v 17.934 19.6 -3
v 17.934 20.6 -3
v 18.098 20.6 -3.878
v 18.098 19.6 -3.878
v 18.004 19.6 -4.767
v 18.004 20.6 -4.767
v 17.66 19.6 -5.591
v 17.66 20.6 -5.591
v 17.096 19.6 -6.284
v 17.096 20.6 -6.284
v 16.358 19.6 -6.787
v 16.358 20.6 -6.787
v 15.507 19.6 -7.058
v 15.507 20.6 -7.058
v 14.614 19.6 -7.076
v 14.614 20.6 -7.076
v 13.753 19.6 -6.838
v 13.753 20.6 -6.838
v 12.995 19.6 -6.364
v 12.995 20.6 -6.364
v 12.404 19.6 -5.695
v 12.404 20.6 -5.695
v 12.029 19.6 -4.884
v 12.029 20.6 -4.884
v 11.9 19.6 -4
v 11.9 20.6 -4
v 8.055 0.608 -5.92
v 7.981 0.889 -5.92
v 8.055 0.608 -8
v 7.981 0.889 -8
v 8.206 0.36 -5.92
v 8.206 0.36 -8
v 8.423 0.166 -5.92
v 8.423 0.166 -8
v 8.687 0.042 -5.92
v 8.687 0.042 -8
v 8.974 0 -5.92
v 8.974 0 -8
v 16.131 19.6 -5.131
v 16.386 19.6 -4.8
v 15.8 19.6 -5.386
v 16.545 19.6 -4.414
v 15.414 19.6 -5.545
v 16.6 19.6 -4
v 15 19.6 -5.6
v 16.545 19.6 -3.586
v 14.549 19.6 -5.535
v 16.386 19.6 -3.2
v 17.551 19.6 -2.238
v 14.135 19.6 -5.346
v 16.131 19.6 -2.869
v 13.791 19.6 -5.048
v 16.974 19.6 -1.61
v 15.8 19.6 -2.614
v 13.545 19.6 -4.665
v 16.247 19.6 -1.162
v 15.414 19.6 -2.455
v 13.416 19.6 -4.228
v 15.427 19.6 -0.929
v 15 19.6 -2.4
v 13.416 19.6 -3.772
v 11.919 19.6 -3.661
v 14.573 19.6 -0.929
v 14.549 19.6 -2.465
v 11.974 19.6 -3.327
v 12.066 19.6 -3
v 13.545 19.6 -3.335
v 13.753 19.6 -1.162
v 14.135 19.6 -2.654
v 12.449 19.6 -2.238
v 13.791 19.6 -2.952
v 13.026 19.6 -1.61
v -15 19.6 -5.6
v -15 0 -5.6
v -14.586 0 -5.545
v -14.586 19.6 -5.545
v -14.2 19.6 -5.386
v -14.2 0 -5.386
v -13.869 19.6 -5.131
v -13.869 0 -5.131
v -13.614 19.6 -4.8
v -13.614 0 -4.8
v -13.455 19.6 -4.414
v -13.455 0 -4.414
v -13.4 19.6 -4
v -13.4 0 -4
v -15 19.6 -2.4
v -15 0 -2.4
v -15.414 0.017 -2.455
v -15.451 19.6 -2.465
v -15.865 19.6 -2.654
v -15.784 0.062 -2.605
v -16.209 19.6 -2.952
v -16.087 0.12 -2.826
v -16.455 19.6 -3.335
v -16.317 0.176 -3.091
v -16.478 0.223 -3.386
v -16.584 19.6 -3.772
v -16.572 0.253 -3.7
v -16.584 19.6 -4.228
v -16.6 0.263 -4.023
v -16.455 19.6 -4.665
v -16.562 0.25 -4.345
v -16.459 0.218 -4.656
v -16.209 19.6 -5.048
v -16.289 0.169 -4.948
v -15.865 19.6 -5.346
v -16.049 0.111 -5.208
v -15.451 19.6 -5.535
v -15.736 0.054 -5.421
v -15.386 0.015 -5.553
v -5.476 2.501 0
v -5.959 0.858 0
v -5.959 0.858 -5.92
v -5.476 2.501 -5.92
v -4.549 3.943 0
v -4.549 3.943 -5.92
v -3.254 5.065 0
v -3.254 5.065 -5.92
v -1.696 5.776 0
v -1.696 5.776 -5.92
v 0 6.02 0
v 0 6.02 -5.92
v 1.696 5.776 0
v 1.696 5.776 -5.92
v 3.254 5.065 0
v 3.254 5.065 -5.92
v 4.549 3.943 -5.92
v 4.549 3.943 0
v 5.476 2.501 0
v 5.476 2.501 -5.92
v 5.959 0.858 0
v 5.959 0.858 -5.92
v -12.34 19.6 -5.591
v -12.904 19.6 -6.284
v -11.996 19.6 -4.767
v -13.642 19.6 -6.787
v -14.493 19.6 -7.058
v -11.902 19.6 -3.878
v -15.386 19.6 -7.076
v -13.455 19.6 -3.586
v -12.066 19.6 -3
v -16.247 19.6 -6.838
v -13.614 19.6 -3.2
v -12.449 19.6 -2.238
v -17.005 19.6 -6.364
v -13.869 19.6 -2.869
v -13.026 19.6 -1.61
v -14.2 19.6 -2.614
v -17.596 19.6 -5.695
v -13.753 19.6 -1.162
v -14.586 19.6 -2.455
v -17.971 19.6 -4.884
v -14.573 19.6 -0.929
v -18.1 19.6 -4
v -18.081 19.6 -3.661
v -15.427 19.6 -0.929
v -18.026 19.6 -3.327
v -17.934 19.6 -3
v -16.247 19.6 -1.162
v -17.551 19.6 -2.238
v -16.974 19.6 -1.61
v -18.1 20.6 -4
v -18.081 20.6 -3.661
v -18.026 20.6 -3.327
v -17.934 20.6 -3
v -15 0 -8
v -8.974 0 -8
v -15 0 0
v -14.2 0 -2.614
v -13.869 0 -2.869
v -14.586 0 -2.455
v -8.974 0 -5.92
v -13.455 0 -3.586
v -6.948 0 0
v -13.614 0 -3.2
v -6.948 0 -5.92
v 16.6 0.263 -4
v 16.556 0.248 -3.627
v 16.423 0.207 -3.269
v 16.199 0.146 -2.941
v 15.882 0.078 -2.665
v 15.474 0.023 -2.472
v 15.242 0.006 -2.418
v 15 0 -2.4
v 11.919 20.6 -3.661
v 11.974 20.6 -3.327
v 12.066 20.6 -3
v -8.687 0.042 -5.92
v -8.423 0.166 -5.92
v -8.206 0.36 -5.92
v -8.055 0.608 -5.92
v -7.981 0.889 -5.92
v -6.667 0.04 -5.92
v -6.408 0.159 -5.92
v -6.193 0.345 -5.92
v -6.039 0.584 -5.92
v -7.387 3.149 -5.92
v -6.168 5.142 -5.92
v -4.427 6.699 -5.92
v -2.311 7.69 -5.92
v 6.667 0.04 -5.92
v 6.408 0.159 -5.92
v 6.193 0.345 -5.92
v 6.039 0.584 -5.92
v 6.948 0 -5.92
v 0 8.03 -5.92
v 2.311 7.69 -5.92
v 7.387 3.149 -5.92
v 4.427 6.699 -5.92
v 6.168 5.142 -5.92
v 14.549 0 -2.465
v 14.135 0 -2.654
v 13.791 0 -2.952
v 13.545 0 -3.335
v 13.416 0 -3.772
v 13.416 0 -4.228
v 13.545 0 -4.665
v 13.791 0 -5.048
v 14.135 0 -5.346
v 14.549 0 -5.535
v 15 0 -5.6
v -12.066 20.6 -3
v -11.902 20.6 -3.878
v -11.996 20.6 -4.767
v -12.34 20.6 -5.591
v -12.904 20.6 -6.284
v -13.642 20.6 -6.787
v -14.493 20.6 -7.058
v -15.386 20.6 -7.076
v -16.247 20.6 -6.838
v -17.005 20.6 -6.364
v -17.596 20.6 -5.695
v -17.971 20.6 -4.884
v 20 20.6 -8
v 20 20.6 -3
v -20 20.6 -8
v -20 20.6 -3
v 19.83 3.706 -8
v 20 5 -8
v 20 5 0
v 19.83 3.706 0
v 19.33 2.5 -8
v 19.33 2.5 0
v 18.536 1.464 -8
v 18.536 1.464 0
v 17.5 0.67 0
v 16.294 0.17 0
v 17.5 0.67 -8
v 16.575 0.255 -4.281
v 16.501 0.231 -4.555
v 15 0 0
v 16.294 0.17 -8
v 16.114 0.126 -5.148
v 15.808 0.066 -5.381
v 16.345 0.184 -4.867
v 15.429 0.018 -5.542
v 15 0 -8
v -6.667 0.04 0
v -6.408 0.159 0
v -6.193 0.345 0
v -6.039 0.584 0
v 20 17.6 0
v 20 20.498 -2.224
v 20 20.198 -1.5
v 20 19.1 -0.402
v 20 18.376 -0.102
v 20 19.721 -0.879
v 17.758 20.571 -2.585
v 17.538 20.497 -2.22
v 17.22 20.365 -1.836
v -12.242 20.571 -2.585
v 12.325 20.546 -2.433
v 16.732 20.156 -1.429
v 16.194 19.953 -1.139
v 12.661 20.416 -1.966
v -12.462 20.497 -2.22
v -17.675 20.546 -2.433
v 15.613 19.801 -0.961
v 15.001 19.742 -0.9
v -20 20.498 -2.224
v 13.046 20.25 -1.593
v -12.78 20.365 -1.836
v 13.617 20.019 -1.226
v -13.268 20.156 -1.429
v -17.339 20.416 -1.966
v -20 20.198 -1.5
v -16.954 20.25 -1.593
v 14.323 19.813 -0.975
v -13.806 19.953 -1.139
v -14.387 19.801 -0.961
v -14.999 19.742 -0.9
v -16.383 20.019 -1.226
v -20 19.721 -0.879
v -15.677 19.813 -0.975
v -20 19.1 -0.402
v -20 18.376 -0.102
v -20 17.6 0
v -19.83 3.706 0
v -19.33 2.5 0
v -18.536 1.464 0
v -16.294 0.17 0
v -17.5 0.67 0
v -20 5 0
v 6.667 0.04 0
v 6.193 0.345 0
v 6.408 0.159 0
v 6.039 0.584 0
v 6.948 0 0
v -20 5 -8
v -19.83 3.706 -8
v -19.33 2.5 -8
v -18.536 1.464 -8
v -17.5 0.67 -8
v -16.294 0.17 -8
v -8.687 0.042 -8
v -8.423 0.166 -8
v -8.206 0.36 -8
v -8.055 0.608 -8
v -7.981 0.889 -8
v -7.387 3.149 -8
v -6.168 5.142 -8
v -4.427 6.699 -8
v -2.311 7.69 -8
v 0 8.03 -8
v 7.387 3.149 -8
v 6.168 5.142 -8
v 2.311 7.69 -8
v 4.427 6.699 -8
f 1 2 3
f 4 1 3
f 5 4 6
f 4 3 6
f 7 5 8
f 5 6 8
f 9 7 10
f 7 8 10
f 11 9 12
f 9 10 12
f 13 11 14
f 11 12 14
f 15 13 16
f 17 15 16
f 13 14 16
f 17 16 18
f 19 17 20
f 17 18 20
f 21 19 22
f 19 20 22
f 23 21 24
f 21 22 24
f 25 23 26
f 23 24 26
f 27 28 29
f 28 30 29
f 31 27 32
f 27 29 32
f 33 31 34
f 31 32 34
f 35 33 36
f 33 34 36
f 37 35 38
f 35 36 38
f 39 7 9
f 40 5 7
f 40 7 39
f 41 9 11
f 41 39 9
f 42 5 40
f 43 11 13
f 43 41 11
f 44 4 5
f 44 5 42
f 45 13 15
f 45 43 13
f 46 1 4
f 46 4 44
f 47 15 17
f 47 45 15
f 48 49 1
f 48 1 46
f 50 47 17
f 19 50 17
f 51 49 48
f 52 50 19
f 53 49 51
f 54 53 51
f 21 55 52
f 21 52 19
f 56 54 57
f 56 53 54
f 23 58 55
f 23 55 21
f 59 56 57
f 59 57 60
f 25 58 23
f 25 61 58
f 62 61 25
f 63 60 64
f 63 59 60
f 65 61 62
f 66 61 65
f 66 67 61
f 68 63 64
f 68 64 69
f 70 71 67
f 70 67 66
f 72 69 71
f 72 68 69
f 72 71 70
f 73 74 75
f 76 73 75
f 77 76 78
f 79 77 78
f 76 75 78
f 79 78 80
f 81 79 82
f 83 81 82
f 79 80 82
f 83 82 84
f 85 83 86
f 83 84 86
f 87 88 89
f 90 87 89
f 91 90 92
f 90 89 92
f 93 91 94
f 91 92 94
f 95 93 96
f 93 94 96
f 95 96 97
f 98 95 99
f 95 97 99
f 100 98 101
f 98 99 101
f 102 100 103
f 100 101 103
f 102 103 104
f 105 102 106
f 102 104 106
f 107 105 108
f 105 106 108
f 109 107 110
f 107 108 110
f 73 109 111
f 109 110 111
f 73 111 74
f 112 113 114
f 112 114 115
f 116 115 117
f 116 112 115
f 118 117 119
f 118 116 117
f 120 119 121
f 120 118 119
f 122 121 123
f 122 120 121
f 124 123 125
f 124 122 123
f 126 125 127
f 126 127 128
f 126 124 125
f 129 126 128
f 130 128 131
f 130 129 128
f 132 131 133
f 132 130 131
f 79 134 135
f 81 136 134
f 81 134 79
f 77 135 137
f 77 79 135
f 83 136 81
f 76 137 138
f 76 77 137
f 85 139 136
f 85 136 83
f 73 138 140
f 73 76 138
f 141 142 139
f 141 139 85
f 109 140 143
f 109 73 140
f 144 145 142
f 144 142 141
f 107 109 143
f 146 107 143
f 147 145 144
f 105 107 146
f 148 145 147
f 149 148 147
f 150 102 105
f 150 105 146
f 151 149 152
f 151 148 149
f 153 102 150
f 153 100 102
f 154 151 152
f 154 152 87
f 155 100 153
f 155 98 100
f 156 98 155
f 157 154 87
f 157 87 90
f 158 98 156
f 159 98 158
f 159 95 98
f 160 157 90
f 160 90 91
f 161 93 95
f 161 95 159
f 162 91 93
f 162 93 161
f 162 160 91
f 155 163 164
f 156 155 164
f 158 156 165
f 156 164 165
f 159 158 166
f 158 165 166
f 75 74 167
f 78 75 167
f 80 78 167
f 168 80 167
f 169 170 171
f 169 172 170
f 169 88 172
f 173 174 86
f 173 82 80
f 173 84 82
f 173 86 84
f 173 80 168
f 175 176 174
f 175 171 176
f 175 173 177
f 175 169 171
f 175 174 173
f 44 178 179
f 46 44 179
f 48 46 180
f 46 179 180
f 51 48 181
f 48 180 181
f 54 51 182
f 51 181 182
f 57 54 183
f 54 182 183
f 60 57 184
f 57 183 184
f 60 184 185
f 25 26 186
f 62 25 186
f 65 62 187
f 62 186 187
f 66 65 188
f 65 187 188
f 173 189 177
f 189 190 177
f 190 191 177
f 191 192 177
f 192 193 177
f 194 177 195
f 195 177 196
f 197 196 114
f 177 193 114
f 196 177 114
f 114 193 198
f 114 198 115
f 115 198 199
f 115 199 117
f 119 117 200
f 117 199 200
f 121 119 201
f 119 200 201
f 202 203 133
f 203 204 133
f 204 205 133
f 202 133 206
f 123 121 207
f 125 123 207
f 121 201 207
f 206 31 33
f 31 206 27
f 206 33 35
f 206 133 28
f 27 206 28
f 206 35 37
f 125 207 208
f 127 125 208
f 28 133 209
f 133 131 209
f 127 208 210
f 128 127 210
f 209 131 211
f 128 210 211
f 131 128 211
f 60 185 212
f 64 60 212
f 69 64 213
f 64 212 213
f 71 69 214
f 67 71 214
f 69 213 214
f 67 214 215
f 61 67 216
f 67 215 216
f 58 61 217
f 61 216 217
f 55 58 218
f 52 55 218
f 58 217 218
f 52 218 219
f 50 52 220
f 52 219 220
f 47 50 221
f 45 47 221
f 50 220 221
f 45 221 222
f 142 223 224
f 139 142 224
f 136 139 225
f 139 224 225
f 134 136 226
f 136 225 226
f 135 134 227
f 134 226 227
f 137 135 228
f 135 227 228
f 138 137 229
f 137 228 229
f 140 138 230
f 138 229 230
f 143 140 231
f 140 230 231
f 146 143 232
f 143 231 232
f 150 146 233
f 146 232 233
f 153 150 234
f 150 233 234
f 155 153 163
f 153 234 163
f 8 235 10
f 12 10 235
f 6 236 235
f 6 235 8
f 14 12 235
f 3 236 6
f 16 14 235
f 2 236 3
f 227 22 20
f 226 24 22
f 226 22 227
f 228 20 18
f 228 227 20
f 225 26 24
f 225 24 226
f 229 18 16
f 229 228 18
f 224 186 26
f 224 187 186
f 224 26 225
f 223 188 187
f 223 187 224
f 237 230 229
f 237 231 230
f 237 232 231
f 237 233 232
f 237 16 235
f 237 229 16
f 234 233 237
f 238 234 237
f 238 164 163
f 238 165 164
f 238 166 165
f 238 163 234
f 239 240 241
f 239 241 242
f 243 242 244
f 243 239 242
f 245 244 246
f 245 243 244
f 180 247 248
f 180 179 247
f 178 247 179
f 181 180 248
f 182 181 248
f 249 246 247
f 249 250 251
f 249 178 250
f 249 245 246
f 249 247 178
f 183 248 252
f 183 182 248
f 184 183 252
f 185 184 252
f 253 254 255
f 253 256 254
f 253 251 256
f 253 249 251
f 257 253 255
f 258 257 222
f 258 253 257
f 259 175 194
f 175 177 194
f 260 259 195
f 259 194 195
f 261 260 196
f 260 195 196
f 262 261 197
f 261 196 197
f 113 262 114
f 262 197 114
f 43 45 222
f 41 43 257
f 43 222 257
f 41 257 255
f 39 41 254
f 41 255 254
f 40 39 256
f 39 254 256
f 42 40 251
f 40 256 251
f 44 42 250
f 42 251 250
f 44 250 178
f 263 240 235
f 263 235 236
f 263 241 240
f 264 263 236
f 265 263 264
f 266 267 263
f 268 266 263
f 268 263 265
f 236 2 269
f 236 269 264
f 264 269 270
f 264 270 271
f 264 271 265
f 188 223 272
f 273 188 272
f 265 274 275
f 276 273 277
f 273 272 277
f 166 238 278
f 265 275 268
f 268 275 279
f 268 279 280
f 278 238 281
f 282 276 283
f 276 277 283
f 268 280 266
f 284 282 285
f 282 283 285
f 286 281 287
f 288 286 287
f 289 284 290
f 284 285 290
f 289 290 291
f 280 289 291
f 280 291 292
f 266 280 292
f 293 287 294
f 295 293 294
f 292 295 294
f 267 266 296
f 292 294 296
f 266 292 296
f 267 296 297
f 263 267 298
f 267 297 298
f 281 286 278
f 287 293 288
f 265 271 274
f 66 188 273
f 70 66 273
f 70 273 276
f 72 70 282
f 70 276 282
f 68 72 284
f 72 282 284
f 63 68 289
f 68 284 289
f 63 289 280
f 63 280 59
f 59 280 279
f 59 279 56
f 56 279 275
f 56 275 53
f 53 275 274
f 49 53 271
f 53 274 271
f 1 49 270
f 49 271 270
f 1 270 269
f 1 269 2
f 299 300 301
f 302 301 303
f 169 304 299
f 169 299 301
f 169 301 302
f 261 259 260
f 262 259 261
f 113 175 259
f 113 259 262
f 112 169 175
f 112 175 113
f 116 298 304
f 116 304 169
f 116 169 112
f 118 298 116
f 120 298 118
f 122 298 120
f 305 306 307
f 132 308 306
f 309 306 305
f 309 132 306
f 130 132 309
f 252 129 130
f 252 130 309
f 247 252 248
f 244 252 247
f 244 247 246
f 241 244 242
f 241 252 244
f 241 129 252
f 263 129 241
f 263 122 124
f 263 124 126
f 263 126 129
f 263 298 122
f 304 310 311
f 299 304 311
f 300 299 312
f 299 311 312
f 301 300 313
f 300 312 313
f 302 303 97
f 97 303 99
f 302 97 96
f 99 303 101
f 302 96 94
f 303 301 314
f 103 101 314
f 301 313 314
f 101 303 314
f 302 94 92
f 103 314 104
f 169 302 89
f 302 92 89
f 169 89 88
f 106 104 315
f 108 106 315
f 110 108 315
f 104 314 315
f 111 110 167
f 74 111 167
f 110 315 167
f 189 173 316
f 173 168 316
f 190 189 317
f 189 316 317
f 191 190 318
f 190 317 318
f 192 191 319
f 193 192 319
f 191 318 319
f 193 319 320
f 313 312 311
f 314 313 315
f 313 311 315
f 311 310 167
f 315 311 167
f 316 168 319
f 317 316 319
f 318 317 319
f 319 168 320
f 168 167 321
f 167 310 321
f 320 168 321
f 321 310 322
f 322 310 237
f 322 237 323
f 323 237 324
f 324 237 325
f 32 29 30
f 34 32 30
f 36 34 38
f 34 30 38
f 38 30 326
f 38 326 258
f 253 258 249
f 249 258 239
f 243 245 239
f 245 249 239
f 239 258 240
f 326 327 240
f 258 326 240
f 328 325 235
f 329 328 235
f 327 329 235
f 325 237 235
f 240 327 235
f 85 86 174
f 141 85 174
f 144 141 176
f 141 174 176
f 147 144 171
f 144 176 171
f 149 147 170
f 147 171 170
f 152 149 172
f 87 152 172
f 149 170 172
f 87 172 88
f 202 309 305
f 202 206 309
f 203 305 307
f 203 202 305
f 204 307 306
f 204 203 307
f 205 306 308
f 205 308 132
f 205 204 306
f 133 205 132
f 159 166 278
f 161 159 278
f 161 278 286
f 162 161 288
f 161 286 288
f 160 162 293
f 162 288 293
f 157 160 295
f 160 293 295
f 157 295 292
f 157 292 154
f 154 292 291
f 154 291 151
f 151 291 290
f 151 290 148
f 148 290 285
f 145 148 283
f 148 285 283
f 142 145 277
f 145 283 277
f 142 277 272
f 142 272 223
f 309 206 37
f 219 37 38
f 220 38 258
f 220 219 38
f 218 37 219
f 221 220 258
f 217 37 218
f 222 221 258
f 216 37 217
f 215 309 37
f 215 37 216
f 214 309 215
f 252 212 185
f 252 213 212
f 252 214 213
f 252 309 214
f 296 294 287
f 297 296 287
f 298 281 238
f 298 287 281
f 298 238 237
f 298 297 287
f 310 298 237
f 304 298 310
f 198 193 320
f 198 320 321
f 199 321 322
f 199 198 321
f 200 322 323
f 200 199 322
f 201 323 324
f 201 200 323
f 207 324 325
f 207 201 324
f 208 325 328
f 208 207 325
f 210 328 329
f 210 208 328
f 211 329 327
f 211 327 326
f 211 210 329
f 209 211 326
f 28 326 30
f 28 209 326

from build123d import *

# Parameters (mm, degrees)
F1_DEPTH  = 8
F2_DEPTH  = 5.92
F3_R      = 3
F4_R      = 5
F6_DEPTH  = 20.601
F8_DEPTH  = 20.6010001
F9_R      = 1
F11_DEPTH = 1


with BuildPart() as f1:
    # F0 (on Top) → F1 (new body)
    with BuildSketch(Plane.XY):
        with BuildLine():
            Line((-20, 20.6), (-20, 0))
            Line((-20, 0), (-8.03, 0))
            ThreePointArc((-8.03, 0), (0, 8.03), (8.03, 0))
            Line((8.03, 0), (20, 0))
            Line((20, 0), (20, 20.6))
            Line((20, 20.6), (-20, 20.6))
        make_face()
    extrude(amount=-F1_DEPTH)

    # F0 (on Top) → F2 (join)
    with BuildSketch(Plane.XY):
        with BuildLine():
            ThreePointArc((8.03, 0), (0, 8.03), (-8.03, 0))
            Line((-8.03, 0), (-6.02, 0))
            ThreePointArc((-6.02, 0), (0, 6.02), (6.02, 0))
            Line((6.02, 0), (8.03, 0))
        make_face()
    extrude(amount=-F2_DEPTH)

    # F3
    f3_edges = [f1.edges().sort_by_distance(p)[0] for p in [
        (0, 20.6, 0),
    ]]
    fillet(f3_edges, radius=F3_R)

    # F4
    f4_edges = [f1.edges().sort_by_distance(p)[0] for p in [
        (-20, 0, -4),
        (20, 0, -4),
    ]]
    fillet(f4_edges, radius=F4_R)

    # F5 (on face) → F6 (cut, through all)
    with BuildSketch(Plane.XZ):
        with BuildLine():
            Line((-15, -5.6), (-15, -2.4))
            ThreePointArc((-15, -2.4), (-16.6, -4), (-15, -5.6))
        make_face()
        with BuildLine():
            ThreePointArc((-15, -5.6), (-13.8686291501, -5.1313708499), (-13.4, -4))
            ThreePointArc((-13.4, -4), (-13.8686291501, -2.8686291501), (-15, -2.4))
            Line((-15, -2.4), (-15, -5.6))
        make_face()
    extrude(amount=-F6_DEPTH, mode=Mode.SUBTRACT)

    # F7 (on face) → F8 (cut, through all)
    with BuildSketch(Plane.XZ):
        with BuildLine():
            Line((15, -5.6), (15, -2.4))
            ThreePointArc((15, -2.4), (13.4, -4), (15, -5.6))
        make_face()
        with BuildLine():
            ThreePointArc((15, -5.6), (16.1313708499, -5.1313708499), (16.6, -4))
            ThreePointArc((16.6, -4), (16.1313708499, -2.8686291501), (15, -2.4))
            Line((15, -2.4), (15, -5.6))
        make_face()
    extrude(amount=-F8_DEPTH, mode=Mode.SUBTRACT)

    # F9
    f9_edges = [f1.edges().sort_by_distance(p)[0] for p in [
        (-8.03, 0, -6.96),
        (-6.02, 0, -2.96),
        (6.02, 0, -2.96),
        (8.03, 0, -6.96),
    ]]
    fillet(f9_edges, radius=F9_R)

    # F10 (on face) → F11 (cut)
    with BuildSketch(Plane(origin=(0, 20.6, 0), x_dir=(-1, 0, 0), z_dir=(0, 1, 0))):
        with BuildLine():
            Line((-13.7510004003, -3), (-12.0657198498, -3))
            ThreePointArc((-12.0657198498, -3), (-15, -0.9), (-17.9342801502, -3))
            Line((-17.9342801502, -3), (-16.2489995997, -3))
            ThreePointArc((-16.2489995997, -3), (-16.4422205102, -4.692820323), (-15, -5.6))
            ThreePointArc((-15, -5.6), (-13.5577794898, -4.692820323), (-13.7510004003, -3))
        make_face()
        with BuildLine():
            ThreePointArc((-17.9342801502, -3), (-15.5068192648, -7.0582894292), (-11.9, -4))
            ThreePointArc((-11.9, -4), (-11.9417105708, -3.4931807352), (-12.0657198498, -3))
            Line((-12.0657198498, -3), (-13.7510004003, -3))
            ThreePointArc((-13.7510004003, -3), (-13.5577794898, -4.692820323), (-15, -5.6))
            ThreePointArc((-15, -5.6), (-16.4422205102, -4.692820323), (-16.2489995997, -3))
            Line((-16.2489995997, -3), (-17.9342801502, -3))
        make_face()
        with BuildLine():
            ThreePointArc((17.9342801502, -3), (15, -0.9), (12.0657198498, -3))
            Line((12.0657198498, -3), (13.7510004003, -3))
            ThreePointArc((13.7510004003, -3), (13.5577794898, -4.692820323), (15, -5.6))
            ThreePointArc((15, -5.6), (16.4422205102, -4.692820323), (16.2489995997, -3))
            Line((16.2489995997, -3), (17.9342801502, -3))
        make_face()
        with BuildLine():
            Line((13.7510004003, -3), (12.0657198498, -3))
            ThreePointArc((12.0657198498, -3), (14.4931807352, -7.0582894292), (18.1, -4))
            ThreePointArc((18.1, -4), (18.0582894292, -3.4931807352), (17.9342801502, -3))
            Line((17.9342801502, -3), (16.2489995997, -3))
            ThreePointArc((16.2489995997, -3), (16.4422205102, -4.692820323), (15, -5.6))
            ThreePointArc((15, -5.6), (13.5577794898, -4.692820323), (13.7510004003, -3))
        make_face()
    extrude(amount=-F11_DEPTH, mode=Mode.SUBTRACT)


solid = f1.part
